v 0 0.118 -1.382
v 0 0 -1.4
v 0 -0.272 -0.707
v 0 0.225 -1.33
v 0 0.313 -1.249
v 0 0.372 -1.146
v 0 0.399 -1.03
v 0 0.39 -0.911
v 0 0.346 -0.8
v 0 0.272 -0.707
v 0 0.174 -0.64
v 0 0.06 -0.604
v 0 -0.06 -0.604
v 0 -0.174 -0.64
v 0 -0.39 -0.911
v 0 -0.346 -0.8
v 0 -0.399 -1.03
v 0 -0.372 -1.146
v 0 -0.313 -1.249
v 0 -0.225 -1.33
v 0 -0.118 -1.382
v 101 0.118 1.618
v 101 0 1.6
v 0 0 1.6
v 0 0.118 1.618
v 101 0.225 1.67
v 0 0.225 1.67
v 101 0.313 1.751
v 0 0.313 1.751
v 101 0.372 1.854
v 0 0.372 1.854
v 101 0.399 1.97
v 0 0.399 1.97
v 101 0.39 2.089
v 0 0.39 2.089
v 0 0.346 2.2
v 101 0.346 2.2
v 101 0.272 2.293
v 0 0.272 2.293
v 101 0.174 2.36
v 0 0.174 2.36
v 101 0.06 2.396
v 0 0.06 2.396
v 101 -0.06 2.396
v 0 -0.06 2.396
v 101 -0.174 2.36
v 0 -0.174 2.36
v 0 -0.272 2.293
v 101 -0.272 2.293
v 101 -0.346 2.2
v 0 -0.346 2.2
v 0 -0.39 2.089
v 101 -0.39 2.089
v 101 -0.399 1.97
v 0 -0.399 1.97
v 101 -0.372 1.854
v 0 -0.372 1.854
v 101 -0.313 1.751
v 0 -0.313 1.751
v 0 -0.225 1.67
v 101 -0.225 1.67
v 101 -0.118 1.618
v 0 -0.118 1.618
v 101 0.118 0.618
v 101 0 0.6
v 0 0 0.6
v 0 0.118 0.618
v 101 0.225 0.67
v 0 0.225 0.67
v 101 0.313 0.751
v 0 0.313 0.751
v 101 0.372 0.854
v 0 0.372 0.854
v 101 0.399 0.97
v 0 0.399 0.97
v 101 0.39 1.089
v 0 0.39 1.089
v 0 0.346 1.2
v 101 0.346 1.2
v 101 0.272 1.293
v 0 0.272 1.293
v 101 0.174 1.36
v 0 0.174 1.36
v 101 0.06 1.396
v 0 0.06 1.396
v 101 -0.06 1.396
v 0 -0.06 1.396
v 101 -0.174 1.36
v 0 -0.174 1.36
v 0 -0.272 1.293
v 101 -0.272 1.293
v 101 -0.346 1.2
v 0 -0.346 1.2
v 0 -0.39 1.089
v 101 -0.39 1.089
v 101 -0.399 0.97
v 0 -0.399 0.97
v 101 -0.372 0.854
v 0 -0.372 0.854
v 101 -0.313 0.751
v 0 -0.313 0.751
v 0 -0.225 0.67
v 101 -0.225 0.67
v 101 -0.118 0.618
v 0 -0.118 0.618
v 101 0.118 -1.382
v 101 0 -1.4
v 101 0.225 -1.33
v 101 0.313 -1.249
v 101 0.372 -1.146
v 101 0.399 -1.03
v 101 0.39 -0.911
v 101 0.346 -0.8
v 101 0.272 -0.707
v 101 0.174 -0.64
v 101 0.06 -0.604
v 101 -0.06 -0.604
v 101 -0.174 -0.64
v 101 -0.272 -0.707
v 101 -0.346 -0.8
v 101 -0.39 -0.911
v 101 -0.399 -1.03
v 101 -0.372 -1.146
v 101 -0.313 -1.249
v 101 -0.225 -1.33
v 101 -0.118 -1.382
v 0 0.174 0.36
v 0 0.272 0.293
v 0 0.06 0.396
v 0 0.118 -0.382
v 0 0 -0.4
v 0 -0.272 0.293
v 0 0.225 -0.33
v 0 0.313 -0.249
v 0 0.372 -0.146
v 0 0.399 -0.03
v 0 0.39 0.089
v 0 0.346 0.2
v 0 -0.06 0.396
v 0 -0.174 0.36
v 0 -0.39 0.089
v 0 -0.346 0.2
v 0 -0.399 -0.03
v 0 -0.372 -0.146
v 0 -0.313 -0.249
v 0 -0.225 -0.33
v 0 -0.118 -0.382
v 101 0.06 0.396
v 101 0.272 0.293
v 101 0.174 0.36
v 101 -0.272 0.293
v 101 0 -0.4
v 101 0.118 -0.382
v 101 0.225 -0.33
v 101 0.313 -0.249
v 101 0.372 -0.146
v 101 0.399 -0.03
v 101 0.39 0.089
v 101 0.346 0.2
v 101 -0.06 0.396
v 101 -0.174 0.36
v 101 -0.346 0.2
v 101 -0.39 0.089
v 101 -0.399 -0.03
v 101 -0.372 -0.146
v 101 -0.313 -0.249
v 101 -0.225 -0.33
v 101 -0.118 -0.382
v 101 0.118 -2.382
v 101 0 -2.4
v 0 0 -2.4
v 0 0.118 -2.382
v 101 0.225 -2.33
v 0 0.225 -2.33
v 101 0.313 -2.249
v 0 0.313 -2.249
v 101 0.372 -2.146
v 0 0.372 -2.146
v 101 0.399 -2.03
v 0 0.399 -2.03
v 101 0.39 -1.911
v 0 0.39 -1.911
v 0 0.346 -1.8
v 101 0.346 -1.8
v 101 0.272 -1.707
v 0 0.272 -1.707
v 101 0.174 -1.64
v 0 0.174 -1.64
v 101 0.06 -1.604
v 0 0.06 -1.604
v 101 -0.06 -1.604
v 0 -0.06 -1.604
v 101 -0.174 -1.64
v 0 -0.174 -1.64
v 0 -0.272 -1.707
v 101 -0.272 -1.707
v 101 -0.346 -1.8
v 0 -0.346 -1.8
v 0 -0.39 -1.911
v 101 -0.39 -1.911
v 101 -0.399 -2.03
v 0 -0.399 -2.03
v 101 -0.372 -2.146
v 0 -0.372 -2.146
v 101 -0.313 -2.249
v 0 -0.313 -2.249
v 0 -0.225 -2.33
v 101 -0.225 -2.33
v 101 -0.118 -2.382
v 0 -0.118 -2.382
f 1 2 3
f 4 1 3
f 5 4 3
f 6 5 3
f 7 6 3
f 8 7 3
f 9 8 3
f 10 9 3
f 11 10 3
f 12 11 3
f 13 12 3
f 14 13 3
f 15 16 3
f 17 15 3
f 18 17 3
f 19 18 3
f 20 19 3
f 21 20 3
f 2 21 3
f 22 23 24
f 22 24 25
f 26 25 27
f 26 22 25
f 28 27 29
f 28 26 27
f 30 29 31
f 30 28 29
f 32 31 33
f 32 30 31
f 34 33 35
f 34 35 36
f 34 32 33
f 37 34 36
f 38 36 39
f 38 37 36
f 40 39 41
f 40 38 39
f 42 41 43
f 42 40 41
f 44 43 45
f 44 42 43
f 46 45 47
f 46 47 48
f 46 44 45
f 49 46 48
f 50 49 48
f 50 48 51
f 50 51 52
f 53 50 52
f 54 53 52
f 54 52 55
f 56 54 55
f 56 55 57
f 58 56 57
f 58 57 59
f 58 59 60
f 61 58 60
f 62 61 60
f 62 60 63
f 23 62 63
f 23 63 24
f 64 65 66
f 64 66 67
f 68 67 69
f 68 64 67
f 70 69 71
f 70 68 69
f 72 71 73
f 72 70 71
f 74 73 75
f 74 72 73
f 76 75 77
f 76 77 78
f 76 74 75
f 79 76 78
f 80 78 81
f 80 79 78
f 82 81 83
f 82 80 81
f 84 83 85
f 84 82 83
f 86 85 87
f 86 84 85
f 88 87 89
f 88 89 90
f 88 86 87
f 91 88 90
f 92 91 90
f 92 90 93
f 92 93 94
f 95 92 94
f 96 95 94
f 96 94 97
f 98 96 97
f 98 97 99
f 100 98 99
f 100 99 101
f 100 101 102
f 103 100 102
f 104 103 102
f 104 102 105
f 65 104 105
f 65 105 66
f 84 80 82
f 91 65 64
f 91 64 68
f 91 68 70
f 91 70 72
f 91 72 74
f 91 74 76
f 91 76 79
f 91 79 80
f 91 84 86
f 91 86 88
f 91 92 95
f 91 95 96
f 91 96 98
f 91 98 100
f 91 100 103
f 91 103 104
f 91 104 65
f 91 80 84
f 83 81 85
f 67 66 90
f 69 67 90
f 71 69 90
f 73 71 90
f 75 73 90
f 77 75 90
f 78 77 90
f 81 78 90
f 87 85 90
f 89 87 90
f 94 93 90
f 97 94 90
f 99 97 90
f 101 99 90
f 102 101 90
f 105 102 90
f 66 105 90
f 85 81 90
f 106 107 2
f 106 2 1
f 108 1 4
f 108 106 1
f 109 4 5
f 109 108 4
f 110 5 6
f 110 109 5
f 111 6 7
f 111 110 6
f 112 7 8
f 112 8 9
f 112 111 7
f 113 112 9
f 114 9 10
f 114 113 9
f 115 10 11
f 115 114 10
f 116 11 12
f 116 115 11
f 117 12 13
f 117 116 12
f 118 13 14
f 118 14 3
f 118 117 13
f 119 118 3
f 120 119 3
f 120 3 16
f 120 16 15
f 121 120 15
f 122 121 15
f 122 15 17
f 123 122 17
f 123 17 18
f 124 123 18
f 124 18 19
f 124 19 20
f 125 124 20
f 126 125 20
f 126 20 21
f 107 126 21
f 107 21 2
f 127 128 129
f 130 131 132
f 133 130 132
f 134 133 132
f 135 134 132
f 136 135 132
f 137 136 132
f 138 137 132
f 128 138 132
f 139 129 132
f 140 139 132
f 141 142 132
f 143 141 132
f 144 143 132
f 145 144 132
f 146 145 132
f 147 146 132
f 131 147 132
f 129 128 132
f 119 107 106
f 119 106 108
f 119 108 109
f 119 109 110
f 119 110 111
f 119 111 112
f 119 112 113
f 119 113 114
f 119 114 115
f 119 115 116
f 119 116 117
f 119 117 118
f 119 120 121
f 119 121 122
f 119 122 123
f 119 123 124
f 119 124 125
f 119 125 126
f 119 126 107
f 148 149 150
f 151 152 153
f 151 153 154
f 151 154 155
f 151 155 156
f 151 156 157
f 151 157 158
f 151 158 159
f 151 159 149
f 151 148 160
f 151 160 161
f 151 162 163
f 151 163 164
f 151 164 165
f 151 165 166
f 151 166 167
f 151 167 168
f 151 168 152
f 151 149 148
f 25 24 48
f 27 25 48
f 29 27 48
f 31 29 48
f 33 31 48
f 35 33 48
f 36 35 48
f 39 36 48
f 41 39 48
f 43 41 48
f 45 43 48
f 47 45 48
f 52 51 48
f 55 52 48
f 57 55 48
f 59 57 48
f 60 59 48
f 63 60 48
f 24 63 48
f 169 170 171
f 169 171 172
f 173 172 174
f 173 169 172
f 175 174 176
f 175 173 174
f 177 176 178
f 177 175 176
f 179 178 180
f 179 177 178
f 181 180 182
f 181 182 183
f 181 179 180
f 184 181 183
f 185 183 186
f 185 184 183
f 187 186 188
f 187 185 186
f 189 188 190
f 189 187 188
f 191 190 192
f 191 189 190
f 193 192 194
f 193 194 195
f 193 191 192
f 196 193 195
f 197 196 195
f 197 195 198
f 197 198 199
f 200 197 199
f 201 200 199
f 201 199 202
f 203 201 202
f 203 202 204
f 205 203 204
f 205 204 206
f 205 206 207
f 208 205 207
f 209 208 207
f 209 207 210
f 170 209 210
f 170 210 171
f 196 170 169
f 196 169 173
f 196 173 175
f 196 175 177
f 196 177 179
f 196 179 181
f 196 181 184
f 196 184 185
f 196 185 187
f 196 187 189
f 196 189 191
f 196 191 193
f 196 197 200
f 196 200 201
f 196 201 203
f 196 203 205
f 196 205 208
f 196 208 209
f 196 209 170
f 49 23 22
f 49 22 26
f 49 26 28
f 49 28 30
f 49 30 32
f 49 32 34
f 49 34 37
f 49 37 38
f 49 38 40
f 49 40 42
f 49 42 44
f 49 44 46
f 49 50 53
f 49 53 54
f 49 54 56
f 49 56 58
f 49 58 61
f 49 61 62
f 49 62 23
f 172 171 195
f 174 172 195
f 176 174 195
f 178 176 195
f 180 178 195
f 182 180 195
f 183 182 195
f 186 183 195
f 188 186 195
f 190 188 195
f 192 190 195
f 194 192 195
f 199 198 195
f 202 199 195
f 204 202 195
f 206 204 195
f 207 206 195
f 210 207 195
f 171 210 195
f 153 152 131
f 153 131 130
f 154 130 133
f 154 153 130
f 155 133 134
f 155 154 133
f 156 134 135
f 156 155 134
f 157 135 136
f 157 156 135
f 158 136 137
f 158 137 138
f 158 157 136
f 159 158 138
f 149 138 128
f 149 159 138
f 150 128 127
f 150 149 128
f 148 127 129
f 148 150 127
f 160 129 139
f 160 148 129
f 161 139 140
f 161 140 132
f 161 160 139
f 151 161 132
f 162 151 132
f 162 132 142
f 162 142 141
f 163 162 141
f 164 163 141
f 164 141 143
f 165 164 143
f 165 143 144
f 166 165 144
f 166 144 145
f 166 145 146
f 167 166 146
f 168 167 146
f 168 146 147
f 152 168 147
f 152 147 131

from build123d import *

# Parameters (mm, degrees)
SKETCH21_R = 0.4


with BuildPart() as part:
    # Sweep2: sweep along a path in Sketch3
    with BuildLine(Plane(origin=(0, 0, 0), x_dir=(1, 0, 0), z_dir=(0, 1, 0))) as sweep2_path:
        Line((0, -2), (101, -2))
    # Sketch21 → Sweep2 (sweep)
    with BuildSketch(Plane(origin=(0, 0, 0), x_dir=(0, 0, -1), z_dir=(1, 0, 0))):
        with Locations((2, 0)):
            Circle(SKETCH21_R)
        with Locations((1, 0)):
            Circle(SKETCH21_R)
        Circle(SKETCH21_R)
        with Locations((-1, 0)):
            Circle(SKETCH21_R)
        with Locations((-2, 0)):
            Circle(SKETCH21_R)
    sweep(path=sweep2_path.line)


solid = part.part
